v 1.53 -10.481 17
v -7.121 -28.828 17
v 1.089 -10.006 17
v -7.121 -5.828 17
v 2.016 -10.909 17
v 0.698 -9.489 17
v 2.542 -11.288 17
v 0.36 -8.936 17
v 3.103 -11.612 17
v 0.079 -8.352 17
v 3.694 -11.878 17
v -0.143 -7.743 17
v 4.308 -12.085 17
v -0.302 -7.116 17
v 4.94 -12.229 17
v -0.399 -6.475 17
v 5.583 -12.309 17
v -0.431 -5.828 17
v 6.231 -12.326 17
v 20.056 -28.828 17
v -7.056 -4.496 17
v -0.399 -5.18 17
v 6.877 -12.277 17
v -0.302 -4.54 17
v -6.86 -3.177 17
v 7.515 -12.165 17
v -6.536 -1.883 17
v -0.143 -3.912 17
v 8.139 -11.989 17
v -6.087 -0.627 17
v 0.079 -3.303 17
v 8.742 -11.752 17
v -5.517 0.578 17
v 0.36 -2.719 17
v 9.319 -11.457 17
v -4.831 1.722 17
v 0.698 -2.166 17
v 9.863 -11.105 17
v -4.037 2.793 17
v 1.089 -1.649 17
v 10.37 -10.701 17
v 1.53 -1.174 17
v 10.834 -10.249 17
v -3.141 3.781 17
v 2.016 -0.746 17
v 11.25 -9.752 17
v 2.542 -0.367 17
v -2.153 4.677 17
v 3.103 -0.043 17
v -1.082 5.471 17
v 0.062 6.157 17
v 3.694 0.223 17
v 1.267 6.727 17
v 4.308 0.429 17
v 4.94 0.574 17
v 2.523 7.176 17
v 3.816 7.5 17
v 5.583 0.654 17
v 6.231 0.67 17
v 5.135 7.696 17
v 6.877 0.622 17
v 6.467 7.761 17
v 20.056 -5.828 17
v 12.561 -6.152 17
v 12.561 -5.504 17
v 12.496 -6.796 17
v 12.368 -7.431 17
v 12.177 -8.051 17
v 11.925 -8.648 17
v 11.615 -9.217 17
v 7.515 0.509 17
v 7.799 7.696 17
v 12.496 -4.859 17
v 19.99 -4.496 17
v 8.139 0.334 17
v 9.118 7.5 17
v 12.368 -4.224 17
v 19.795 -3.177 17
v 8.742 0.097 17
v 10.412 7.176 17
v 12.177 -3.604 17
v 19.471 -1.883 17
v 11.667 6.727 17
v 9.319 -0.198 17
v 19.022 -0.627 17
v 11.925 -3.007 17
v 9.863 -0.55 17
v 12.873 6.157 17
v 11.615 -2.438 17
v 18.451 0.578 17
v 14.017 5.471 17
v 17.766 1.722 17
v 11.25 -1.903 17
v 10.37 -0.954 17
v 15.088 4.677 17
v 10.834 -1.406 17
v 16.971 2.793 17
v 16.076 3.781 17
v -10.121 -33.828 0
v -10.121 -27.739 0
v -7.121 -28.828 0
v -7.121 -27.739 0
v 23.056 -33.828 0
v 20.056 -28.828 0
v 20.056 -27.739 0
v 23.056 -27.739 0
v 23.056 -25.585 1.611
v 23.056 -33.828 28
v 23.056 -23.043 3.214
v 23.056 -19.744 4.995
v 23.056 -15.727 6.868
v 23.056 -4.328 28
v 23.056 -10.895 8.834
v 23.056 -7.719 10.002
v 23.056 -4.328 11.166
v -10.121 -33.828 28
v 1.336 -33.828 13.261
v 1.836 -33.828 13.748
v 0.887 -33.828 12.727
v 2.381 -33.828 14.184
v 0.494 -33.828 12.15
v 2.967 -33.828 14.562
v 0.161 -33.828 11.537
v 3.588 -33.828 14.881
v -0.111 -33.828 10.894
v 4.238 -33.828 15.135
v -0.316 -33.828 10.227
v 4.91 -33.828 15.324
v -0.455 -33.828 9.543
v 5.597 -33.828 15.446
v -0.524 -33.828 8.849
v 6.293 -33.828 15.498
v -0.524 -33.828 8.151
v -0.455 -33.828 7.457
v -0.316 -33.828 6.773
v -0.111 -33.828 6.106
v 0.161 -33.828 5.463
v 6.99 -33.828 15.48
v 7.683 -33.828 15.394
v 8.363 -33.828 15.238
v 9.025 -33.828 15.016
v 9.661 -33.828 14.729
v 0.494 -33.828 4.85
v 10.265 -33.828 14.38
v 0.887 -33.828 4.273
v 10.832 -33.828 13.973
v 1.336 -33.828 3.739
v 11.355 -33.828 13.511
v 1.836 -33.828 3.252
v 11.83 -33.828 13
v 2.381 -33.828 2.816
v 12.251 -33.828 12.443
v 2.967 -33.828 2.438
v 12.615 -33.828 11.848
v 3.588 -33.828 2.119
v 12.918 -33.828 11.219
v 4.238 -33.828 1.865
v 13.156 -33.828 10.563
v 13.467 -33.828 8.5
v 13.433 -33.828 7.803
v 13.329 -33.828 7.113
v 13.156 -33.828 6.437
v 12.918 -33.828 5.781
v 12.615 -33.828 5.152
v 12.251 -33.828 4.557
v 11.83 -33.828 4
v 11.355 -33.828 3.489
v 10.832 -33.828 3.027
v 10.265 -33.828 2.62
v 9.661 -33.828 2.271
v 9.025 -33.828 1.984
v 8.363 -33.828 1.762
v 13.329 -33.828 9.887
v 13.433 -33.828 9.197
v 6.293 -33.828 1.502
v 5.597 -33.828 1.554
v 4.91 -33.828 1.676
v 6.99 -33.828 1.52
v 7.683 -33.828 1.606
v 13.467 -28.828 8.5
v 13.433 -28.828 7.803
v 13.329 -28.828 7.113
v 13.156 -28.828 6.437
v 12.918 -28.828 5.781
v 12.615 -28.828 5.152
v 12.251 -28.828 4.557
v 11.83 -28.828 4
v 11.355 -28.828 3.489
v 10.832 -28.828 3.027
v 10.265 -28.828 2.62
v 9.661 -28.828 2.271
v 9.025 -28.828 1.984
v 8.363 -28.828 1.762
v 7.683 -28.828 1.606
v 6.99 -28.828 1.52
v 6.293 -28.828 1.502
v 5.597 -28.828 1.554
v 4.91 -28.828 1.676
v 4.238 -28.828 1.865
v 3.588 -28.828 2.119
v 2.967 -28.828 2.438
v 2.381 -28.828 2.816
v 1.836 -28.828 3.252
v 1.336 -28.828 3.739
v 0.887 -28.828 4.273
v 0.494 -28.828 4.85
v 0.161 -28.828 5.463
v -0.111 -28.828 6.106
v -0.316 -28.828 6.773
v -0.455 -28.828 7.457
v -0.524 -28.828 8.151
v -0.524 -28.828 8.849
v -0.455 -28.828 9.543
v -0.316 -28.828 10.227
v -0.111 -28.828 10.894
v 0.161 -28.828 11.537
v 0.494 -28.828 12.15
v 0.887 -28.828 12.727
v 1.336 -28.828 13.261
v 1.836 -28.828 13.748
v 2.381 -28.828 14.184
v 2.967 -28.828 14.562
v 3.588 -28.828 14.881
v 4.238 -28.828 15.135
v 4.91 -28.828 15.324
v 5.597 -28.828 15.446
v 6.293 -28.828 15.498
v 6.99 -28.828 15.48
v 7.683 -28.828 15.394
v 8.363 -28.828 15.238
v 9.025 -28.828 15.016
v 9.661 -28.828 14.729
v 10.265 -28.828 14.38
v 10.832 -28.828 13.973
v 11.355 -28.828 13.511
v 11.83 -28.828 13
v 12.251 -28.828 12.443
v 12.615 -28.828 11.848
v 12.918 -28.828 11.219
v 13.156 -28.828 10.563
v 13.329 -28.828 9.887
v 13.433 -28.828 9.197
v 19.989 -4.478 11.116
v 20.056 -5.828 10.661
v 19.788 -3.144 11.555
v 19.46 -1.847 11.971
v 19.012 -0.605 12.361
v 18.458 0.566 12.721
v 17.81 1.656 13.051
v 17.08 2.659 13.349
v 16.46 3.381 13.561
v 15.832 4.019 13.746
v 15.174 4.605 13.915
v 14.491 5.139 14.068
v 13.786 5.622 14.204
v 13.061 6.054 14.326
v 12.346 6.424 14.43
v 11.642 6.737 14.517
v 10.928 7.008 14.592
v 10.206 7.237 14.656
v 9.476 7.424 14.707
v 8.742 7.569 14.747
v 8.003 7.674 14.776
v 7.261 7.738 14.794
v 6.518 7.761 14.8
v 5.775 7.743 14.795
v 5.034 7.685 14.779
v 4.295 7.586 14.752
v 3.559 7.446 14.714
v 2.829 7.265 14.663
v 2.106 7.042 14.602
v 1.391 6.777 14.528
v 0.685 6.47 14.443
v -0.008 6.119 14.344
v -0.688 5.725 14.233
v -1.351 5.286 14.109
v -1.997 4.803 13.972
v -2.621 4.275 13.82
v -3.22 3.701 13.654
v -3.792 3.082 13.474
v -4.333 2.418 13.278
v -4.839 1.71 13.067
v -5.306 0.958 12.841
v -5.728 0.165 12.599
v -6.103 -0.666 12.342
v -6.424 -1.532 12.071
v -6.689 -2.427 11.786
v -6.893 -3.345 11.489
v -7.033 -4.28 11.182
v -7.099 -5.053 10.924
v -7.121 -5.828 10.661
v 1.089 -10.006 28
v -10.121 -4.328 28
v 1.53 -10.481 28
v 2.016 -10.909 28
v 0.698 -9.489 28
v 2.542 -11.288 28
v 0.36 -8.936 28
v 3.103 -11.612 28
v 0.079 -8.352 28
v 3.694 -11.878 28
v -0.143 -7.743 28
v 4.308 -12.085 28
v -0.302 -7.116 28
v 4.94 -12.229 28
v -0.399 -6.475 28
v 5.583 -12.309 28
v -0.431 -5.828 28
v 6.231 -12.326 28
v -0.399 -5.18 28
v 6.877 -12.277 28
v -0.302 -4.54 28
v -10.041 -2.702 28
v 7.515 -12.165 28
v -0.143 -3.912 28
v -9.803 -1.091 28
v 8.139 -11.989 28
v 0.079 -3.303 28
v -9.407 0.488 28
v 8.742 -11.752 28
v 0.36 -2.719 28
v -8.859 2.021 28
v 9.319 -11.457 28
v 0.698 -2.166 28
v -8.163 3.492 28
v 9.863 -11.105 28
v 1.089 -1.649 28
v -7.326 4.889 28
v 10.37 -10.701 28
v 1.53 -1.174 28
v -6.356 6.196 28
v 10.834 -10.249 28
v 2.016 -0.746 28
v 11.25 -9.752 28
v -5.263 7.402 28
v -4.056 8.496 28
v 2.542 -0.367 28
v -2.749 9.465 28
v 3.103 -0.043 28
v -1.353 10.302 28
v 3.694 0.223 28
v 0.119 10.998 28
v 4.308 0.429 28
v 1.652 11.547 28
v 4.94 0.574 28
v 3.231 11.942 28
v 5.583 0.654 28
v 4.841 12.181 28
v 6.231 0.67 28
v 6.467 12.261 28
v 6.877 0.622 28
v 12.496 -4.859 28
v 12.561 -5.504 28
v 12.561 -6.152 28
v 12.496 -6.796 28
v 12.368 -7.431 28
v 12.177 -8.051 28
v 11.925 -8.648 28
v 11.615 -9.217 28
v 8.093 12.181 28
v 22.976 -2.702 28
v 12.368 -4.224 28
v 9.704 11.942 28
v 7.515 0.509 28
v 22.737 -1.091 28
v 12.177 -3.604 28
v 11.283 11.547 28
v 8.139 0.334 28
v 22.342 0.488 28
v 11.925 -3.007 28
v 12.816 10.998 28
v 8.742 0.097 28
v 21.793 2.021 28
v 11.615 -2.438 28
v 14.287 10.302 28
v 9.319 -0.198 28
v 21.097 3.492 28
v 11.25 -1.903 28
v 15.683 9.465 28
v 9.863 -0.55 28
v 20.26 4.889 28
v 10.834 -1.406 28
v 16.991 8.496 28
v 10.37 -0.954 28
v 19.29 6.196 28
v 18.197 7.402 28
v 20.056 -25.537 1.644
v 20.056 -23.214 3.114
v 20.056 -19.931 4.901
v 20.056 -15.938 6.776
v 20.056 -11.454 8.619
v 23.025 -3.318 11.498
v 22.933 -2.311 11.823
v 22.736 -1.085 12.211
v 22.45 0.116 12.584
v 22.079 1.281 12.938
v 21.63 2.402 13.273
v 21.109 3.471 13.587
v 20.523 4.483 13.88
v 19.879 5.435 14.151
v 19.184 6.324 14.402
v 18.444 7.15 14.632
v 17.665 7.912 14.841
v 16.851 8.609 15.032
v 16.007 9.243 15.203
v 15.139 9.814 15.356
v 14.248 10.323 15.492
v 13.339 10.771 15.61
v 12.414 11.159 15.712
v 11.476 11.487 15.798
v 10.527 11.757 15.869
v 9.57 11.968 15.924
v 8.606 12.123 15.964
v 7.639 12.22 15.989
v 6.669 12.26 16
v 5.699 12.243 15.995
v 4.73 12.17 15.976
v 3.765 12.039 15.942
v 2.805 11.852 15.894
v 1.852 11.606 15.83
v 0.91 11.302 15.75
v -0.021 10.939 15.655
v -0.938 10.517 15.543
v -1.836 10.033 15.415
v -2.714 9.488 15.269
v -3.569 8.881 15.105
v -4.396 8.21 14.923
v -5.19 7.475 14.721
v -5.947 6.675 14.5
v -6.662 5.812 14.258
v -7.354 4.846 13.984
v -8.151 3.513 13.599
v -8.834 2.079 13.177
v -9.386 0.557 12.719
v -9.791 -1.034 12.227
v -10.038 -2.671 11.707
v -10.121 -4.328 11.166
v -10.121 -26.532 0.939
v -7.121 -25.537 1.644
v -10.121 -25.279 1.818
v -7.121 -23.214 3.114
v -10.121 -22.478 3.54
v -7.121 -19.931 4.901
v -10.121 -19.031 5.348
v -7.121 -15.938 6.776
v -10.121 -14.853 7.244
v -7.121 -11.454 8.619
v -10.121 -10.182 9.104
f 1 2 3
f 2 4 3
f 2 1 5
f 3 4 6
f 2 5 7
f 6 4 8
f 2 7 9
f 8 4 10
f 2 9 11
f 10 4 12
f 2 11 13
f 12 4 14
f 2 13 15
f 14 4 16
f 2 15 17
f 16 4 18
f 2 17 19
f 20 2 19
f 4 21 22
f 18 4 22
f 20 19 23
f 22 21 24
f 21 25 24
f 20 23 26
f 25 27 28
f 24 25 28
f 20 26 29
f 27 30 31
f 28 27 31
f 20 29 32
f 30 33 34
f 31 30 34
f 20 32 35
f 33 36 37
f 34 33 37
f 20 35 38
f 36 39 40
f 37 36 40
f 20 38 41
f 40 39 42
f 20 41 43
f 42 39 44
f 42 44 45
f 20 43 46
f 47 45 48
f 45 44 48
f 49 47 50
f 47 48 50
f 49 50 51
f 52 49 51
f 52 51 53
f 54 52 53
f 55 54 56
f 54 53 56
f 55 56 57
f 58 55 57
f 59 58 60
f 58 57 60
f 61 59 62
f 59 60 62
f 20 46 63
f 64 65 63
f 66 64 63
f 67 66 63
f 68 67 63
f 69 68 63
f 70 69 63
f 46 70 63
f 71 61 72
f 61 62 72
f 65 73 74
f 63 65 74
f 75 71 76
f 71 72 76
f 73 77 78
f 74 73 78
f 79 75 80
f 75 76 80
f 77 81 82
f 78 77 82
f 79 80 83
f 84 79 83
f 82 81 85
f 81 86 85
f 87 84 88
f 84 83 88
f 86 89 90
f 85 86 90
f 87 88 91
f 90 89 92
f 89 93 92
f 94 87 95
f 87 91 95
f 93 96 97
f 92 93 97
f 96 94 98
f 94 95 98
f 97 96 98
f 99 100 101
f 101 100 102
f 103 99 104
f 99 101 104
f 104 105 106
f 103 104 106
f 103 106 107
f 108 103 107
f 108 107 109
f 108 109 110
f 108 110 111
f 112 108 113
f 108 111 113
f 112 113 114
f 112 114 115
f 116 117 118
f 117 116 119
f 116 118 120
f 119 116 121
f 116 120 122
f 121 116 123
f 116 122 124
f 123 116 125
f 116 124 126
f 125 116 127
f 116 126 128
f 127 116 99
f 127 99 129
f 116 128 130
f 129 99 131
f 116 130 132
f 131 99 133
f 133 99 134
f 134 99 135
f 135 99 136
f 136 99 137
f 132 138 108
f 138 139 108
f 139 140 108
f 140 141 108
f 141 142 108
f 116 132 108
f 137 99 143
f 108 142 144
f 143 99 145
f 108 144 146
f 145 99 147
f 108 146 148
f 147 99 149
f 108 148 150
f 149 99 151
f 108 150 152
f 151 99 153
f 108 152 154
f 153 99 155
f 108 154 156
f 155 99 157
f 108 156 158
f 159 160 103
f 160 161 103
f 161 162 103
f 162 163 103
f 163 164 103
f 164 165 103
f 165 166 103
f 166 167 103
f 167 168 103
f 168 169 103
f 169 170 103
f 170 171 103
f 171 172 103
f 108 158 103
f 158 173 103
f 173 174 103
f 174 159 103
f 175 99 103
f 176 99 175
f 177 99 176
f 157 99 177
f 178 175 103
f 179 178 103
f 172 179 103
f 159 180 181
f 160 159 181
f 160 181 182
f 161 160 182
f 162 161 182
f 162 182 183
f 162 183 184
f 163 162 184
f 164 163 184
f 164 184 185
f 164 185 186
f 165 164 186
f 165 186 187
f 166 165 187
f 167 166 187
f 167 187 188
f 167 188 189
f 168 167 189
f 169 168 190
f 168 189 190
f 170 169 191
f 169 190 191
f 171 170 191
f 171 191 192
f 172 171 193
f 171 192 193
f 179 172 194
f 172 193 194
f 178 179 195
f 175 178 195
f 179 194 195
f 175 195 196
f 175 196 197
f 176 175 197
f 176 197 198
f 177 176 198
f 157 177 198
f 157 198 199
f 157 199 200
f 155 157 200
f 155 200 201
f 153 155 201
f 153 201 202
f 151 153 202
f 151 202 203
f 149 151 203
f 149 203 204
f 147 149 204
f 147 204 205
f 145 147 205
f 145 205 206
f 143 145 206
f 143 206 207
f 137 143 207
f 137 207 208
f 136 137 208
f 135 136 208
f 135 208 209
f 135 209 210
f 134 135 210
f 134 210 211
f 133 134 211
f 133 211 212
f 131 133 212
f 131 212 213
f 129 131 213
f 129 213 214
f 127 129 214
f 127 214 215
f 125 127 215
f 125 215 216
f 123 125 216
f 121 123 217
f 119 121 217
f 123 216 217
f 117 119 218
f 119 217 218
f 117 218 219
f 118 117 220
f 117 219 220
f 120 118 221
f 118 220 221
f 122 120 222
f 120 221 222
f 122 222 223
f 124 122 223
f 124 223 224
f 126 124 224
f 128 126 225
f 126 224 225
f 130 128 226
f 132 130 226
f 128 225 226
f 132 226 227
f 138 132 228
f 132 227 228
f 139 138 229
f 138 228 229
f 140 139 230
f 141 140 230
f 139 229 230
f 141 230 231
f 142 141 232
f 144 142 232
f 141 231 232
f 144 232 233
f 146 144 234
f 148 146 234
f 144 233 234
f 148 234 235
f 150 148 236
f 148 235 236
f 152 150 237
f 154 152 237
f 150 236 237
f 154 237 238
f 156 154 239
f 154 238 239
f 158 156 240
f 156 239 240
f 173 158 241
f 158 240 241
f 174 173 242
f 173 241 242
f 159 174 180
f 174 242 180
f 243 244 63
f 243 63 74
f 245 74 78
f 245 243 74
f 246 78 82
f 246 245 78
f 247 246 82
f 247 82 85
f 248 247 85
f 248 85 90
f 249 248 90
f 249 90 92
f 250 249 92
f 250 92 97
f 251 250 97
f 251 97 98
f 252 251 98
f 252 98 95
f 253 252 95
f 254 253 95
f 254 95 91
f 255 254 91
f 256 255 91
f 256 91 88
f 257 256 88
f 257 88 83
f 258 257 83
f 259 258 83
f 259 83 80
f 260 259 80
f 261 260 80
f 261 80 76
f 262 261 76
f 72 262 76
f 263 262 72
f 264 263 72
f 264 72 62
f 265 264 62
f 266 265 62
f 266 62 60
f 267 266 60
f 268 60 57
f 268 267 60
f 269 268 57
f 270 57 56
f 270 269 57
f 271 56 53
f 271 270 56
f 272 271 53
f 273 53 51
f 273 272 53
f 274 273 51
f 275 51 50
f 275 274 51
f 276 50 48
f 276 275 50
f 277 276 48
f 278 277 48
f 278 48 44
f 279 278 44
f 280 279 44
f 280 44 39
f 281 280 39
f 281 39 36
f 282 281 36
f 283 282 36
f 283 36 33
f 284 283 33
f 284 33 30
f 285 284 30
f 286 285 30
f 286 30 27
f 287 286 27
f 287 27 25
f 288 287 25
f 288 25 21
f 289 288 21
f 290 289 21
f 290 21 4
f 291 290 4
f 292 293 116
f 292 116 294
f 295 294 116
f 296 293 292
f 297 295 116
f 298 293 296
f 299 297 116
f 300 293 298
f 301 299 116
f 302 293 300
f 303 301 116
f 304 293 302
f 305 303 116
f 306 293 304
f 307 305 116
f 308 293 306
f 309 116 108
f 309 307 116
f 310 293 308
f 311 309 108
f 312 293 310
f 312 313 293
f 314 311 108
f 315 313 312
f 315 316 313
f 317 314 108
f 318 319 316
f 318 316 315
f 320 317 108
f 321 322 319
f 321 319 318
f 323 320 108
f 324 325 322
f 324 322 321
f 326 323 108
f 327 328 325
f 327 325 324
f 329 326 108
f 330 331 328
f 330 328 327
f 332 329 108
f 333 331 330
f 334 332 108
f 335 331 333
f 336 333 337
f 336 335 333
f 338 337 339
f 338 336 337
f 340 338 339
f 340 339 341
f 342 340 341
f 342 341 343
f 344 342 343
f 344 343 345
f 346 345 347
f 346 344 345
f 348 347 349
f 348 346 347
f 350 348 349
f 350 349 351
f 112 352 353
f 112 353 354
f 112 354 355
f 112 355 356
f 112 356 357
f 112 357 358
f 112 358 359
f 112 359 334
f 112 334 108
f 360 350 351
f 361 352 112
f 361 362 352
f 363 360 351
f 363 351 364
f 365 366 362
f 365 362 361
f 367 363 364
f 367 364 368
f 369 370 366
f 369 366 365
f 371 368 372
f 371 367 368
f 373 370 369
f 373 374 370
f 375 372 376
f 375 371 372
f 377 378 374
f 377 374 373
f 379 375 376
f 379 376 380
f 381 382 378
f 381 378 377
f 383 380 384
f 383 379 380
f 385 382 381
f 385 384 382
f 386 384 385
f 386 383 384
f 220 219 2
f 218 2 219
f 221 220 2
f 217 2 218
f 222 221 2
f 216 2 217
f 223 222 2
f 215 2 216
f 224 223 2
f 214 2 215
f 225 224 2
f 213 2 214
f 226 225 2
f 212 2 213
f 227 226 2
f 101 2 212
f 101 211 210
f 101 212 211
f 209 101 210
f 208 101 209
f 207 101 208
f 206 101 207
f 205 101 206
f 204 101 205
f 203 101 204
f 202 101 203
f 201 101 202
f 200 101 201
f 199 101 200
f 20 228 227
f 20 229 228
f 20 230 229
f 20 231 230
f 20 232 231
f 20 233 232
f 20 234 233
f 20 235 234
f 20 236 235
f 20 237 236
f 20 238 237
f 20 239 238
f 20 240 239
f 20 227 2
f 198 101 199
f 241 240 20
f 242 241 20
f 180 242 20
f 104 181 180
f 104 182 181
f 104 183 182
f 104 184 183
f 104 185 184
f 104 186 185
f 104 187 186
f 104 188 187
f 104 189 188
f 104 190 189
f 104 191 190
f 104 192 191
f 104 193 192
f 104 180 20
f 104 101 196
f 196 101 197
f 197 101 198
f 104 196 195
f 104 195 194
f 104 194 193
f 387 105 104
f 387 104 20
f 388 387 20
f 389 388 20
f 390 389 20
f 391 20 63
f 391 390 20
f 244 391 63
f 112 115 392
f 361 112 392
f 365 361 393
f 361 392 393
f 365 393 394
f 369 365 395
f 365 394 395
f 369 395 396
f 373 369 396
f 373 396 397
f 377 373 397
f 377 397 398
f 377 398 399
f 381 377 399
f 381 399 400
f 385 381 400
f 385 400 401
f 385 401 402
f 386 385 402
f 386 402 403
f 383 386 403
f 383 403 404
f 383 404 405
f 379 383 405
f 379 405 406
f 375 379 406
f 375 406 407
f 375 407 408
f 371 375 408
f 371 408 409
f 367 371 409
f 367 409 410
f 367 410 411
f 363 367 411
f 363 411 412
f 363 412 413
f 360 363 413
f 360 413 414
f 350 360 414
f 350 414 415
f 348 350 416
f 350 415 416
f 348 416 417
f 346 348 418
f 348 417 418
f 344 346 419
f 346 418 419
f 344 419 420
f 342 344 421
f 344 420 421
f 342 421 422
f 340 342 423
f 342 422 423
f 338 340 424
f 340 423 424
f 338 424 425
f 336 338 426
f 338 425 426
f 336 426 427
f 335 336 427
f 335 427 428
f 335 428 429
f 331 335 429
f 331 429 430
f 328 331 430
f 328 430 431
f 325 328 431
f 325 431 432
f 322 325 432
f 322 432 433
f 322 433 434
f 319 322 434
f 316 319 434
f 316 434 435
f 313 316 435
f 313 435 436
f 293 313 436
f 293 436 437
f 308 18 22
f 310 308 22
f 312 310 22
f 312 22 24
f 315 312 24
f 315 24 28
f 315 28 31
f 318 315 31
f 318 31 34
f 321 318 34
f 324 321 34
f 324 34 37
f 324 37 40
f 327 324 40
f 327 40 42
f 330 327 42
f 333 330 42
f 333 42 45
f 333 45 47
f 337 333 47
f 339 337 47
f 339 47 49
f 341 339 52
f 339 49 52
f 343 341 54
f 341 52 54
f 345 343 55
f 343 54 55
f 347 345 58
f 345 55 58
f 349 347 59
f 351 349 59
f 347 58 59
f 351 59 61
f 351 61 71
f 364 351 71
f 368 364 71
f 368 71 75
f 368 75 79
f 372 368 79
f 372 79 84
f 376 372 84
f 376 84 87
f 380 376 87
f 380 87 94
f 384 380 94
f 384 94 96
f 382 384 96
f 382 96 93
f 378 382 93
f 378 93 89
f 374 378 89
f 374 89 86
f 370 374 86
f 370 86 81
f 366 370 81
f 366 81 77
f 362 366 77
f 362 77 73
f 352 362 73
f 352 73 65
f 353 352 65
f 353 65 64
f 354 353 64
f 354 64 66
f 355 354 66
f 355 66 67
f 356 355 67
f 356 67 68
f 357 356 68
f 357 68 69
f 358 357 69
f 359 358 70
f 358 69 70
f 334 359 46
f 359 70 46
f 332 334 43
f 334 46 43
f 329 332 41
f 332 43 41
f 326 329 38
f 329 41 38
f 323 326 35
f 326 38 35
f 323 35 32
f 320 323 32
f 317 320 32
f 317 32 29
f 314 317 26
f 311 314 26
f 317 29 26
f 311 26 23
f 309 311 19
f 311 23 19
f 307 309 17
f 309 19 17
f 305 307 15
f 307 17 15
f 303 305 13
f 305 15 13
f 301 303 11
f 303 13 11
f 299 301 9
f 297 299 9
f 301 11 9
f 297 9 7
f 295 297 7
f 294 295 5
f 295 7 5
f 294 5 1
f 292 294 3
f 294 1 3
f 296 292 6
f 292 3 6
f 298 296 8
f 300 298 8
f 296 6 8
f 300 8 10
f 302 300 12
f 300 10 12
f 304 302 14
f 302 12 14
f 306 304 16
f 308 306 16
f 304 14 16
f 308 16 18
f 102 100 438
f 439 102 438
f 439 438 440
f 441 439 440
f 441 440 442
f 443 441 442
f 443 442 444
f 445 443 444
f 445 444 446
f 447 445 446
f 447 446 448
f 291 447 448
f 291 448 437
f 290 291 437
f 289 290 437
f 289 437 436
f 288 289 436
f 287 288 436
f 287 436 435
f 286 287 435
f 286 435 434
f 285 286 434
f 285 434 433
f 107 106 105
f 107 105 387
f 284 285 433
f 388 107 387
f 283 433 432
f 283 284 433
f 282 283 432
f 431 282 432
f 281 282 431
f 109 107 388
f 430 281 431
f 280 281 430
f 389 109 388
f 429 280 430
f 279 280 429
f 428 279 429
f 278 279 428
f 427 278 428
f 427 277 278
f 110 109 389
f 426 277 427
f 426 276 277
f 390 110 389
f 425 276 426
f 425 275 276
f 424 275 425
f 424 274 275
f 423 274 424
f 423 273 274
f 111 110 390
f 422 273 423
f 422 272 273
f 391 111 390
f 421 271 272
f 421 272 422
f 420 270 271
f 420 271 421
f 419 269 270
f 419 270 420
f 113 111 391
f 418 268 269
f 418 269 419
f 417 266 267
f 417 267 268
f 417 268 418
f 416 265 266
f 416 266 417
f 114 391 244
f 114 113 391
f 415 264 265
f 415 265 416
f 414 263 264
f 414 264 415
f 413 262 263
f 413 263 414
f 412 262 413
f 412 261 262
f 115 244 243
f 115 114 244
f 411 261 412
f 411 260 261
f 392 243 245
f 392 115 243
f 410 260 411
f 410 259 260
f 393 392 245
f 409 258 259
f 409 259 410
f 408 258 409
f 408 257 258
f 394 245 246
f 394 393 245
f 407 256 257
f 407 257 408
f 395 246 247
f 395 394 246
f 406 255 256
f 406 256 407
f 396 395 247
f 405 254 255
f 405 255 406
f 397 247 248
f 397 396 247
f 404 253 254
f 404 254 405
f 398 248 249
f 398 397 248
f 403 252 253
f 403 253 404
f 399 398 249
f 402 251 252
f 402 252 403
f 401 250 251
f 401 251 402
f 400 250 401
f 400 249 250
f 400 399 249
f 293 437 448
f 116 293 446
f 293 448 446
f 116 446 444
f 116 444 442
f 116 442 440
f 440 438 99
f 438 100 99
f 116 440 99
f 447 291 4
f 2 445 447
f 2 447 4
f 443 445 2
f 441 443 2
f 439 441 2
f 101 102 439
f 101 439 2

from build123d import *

# Parameters (mm, degrees)
BOSS_EXTRUDE1_DEPTH = 28
CUT_EXTRUDE1_DEPTH  = 34.177233055
CUT_EXTRUDE2_DEPTH  = 17
SKETCH7_R           = 6.5
CUT_EXTRUDE3_DEPTH  = 29.0000001
SKETCH8_R           = 7
CUT_EXTRUDE4_DEPTH  = 10


with BuildPart() as part:
    # Sketch1 → Boss-Extrude1 (new body)
    with BuildSketch(Plane.XY):
        with BuildLine():
            Line((-10.121301077, -4.327557758), (-10.121301077, -33.827557937))
            Line((-10.121301077, -33.827557937), (23.055931978, -33.827557937))
            Line((23.055931978, -33.827557937), (23.055931978, -4.327557758))
            ThreePointArc((23.055931978, -4.327557758), (6.467315451, 12.261058769), (-10.121301077, -4.327557758))
        make_face()
    extrude(amount=BOSS_EXTRUDE1_DEPTH)

    # Sketch3 → Cut-Extrude1 (cut, through all)
    with BuildSketch(Plane(origin=(23.055931978, 0, 0), x_dir=(0, 0, -1), z_dir=(1, 0, 0))):
        with BuildLine():
            Line((0, -7.671360057), (0, -27.738941231))
            add(Edge.make_bspline(
                [(0, -27.738941231), (-8.213527787, -17.773605897), (-16, 12.261058769)],
                knots=[0, 0, 0, 1, 1, 1], degree=2))
            Line((-16, 12.261058769), (0, 12.261058769))
            Line((0, 12.261058769), (0, -7.671360057))
        make_face()
    extrude(amount=-CUT_EXTRUDE1_DEPTH, mode=Mode.SUBTRACT)

    # Sketch5 → Cut-Extrude2 (cut)
    with BuildSketch(Plane(origin=(0, 0, 0), x_dir=(-1, 0, 0), z_dir=(0, 0, -1))):
        with BuildLine():
            Line((-20.055931978, -28.827557937), (-20.055931978, -5.827557937))
            ThreePointArc((-20.055931978, -5.827557937), (-6.467315451, 7.76105859), (7.121301077, -5.827557937))
            Line((7.121301077, -5.827557937), (7.121301077, -28.827557937))
            Line((7.121301077, -28.827557937), (-20.055931978, -28.827557937))
        make_face()
    extrude(amount=-CUT_EXTRUDE2_DEPTH, mode=Mode.SUBTRACT)

    # Sketch7 → Cut-Extrude3 (cut, through all)
    with BuildSketch(Plane(origin=(0, 0, 0), x_dir=(-1, 0, 0), z_dir=(0, 0, -1))):
        with Locations((-6.068714161, -5.827557937)):
            Circle(SKETCH7_R)
    extrude(amount=-CUT_EXTRUDE3_DEPTH, mode=Mode.SUBTRACT)

    # Sketch8 → Cut-Extrude4 (cut)
    with BuildSketch(Plane(origin=(0, -28.827557937, 0), x_dir=(1, 0, 0), z_dir=(0, 1, 0))):
        with Locations((6.467315451, -8.5)):
            Circle(SKETCH8_R)
    extrude(amount=-CUT_EXTRUDE4_DEPTH, mode=Mode.SUBTRACT)


solid = part.part
